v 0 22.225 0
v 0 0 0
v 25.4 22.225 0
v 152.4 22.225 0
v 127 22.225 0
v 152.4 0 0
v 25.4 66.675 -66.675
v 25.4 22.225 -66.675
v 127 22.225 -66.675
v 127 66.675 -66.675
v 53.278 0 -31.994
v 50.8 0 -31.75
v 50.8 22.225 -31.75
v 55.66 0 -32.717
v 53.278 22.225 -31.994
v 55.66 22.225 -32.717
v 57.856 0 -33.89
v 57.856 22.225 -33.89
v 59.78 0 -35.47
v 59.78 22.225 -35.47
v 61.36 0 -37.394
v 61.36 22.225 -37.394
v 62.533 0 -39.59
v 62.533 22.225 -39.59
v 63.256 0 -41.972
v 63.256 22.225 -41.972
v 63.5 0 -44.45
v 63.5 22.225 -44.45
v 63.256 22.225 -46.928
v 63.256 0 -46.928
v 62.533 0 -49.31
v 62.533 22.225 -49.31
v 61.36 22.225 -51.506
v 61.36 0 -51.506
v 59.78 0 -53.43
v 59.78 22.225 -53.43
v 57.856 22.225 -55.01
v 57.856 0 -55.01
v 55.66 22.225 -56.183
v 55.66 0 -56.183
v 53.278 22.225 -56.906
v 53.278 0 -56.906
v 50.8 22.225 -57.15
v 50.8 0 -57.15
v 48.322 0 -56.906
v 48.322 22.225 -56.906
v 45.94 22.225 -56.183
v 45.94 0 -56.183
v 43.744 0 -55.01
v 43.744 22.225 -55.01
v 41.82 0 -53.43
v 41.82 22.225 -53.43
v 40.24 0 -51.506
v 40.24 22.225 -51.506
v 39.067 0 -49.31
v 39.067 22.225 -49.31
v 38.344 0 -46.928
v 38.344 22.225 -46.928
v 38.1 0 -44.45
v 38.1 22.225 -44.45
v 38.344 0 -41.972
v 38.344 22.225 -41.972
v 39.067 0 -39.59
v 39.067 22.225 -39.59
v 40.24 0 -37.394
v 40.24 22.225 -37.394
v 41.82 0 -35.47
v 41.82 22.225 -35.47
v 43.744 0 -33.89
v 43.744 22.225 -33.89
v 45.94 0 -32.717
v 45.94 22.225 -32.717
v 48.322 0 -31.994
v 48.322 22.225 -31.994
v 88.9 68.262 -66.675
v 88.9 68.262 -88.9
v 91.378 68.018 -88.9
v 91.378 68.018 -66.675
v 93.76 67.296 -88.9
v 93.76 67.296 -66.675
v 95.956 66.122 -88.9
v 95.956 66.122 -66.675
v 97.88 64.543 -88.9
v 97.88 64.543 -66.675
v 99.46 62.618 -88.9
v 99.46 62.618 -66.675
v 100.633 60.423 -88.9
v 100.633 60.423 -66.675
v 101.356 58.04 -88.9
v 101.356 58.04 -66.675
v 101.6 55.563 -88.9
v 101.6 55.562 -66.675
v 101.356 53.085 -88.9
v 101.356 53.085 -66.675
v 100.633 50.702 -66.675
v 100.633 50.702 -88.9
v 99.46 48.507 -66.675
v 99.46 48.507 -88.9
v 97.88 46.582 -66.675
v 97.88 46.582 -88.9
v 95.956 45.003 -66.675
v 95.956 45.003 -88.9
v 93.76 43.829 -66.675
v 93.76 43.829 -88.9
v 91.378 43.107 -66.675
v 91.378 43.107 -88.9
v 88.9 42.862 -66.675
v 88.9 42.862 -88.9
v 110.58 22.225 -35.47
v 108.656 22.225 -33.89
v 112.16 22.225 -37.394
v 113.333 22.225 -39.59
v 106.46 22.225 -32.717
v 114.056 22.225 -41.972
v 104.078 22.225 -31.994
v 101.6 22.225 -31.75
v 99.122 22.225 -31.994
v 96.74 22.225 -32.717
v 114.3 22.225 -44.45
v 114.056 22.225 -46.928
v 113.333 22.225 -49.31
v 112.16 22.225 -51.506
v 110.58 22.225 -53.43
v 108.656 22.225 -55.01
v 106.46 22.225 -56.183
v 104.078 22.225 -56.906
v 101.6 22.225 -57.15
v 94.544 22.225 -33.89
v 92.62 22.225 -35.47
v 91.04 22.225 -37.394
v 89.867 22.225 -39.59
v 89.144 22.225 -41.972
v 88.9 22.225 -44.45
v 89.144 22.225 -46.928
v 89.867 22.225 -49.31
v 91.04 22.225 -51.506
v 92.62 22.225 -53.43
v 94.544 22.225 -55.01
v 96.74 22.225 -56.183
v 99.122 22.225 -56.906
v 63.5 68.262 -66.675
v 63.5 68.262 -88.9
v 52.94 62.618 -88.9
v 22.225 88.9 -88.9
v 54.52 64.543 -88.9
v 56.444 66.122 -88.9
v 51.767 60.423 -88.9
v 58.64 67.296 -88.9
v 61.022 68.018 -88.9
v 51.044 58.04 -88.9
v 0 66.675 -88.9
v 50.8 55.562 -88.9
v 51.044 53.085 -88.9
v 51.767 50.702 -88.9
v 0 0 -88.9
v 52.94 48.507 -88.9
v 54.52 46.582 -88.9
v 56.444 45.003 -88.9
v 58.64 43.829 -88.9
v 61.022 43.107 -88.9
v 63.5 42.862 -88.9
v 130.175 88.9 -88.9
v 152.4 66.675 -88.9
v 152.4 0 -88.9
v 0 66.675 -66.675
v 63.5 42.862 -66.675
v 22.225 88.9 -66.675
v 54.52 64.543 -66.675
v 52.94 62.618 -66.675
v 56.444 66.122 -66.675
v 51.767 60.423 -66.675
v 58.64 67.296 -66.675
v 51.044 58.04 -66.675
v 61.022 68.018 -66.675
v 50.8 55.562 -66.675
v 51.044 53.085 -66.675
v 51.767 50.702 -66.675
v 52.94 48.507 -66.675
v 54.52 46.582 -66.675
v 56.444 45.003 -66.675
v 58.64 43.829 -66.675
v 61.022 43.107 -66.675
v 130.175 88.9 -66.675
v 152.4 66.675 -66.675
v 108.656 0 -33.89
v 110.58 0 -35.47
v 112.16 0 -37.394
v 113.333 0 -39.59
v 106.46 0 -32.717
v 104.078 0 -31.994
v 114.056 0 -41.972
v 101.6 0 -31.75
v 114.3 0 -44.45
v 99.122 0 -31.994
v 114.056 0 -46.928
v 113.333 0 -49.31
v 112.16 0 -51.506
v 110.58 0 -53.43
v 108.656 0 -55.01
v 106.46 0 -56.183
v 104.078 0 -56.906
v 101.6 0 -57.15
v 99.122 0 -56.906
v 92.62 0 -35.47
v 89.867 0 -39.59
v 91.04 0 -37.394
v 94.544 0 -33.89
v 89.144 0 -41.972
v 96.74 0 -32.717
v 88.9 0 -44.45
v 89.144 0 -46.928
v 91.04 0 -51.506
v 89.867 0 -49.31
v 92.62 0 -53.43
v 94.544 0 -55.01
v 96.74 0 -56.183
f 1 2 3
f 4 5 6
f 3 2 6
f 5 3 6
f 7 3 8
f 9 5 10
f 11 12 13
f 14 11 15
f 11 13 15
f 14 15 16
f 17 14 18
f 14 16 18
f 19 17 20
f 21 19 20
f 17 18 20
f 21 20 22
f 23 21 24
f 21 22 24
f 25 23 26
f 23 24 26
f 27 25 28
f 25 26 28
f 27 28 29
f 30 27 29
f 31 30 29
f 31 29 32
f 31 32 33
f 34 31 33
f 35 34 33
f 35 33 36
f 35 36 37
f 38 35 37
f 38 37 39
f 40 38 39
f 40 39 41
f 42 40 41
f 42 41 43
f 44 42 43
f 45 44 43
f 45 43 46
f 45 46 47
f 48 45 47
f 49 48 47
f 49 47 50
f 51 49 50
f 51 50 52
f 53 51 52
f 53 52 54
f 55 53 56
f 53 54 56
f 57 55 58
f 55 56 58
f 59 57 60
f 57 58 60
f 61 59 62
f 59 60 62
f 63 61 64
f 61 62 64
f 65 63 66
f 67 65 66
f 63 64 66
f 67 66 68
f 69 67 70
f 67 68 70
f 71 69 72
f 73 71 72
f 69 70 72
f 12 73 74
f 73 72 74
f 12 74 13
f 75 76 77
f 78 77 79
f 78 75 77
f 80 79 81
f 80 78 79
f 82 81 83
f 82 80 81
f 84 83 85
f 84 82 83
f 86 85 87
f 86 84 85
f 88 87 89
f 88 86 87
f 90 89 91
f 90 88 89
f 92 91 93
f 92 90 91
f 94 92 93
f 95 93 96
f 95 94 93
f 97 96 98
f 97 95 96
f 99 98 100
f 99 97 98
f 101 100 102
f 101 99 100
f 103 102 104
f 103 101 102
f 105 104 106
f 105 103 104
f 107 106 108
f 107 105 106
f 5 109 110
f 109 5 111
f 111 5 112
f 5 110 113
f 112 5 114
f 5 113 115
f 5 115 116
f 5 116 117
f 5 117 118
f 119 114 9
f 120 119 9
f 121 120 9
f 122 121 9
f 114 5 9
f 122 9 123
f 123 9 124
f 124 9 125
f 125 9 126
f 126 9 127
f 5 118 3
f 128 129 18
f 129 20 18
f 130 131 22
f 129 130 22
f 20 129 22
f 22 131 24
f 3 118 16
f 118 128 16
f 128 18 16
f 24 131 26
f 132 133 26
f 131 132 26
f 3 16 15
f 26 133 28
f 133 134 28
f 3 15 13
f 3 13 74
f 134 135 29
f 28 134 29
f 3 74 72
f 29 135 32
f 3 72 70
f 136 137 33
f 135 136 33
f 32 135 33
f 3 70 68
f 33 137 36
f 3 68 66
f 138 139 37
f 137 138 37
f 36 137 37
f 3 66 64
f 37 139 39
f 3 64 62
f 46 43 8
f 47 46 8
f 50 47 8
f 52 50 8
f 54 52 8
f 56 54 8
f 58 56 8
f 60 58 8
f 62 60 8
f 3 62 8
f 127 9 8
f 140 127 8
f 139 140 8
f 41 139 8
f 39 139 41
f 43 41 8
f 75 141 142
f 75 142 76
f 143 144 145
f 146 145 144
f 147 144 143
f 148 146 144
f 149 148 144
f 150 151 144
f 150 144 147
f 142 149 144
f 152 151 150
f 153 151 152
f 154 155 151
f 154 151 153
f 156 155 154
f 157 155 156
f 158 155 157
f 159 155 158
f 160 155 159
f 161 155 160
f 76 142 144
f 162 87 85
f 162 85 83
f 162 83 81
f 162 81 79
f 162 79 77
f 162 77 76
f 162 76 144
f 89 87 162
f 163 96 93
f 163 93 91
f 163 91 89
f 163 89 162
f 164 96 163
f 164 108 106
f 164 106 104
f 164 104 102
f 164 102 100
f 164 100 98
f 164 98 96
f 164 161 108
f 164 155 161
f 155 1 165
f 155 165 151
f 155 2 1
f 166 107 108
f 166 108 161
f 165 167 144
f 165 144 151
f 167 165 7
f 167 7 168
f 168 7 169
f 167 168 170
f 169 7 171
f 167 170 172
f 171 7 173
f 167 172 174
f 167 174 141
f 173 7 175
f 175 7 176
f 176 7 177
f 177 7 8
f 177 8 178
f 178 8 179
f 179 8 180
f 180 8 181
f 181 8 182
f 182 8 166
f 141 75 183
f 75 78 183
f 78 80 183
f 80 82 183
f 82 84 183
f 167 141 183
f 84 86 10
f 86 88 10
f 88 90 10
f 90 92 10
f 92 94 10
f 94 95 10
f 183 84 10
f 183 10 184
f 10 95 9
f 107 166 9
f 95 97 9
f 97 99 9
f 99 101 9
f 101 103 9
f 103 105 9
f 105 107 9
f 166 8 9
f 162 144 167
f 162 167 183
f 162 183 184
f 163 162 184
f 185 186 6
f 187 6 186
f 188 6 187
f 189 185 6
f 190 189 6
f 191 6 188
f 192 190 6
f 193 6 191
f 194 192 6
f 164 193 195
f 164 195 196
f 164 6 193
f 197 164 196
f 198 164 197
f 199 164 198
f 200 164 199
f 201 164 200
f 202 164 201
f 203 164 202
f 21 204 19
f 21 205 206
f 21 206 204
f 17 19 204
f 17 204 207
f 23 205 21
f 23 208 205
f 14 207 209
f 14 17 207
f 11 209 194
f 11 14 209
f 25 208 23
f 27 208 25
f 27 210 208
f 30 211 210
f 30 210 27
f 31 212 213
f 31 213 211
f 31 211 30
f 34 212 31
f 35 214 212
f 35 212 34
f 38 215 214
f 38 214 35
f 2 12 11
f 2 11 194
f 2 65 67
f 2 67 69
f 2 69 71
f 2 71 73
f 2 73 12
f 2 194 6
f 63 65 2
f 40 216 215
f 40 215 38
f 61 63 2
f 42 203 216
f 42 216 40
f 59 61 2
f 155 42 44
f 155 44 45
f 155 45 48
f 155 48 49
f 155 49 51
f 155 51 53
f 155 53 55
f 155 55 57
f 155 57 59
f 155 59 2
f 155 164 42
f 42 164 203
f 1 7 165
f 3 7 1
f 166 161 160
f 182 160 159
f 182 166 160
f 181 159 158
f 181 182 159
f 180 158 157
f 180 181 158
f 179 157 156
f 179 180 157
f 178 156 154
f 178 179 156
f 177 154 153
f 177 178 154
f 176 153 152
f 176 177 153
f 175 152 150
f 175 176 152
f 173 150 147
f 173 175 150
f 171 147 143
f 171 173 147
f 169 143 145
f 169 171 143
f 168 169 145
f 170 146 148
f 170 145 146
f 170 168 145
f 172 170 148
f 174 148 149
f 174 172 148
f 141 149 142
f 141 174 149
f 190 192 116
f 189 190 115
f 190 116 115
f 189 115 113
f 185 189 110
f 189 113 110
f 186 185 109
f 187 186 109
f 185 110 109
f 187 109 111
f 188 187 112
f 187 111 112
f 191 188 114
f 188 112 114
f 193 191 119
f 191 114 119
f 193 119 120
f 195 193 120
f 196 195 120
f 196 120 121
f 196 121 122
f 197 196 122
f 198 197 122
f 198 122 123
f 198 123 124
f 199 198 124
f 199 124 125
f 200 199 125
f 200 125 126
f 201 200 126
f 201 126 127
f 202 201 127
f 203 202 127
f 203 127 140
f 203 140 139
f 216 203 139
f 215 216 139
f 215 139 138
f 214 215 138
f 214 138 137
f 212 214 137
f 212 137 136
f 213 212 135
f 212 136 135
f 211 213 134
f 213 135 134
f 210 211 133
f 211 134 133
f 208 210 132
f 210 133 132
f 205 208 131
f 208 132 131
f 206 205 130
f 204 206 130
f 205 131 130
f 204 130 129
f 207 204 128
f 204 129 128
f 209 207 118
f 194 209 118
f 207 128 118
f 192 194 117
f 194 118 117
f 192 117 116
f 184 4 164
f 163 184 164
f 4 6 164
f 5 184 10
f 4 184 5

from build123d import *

# Parameters (mm, degrees)
BOSS_EXTRUDE2_DEPTH = 22.225
SKETCH4_W           = 25.4
SKETCH4_H           = 66.675
BOSS_EXTRUDE5_DEPTH = 44.45
CUT_EXTRUDE1_DEPTH  = 189.612103602
SKETCH6_W           = 152.4
SKETCH6_H           = 22.225
BOSS_EXTRUDE6_DEPTH = 66.675
CUT_EXTRUDE2_DEPTH  = 189.612103602
CUT_EXTRUDE3_DEPTH  = 189.612103602
SKETCH9_R           = 12.7
CUT_EXTRUDE4_DEPTH  = 189.612103602
CUT_EXTRUDE5_DEPTH  = 189.612103602


with BuildPart() as part:
    # Sketch1 → Boss-Extrude2 (new body)
    with BuildSketch(Plane(origin=(0, 0, 0), x_dir=(1, 0, 0), z_dir=(0, 1, 0))):
        Polygon((0, 0), (0, 88.9), (25.4, 88.9), (127, 88.9), (152.4, 88.9), (152.4, 0), align=None)
    extrude(amount=BOSS_EXTRUDE2_DEPTH)

    # Sketch4 → Boss-Extrude5 (add)
    with BuildSketch(Plane(origin=(0, 22.225, 0), x_dir=(1, 0, 0), z_dir=(0, 1, 0))):
        with Locations((12.7, 33.3375)):
            Rectangle(SKETCH4_W, SKETCH4_H)
        with Locations((139.7, 33.3375)):
            Rectangle(SKETCH4_W, SKETCH4_H)
    extrude(amount=BOSS_EXTRUDE5_DEPTH)

    # Sketch5 → Cut-Extrude1 (cut, through all)
    with BuildSketch(Plane(origin=(152.4, 0, 0), x_dir=(0, 0, -1), z_dir=(1, 0, 0))):
        Polygon((66.675, 66.675), (0, 22.225), (0, 66.675), align=None)
    extrude(amount=-CUT_EXTRUDE1_DEPTH, mode=Mode.SUBTRACT)

    # Sketch6 → Boss-Extrude6 (add)
    with BuildSketch(Plane(origin=(0, 22.225, 0), x_dir=(1, 0, 0), z_dir=(0, 1, 0))):
        with Locations((76.2, 77.7875)):
            Rectangle(SKETCH6_W, SKETCH6_H)
    extrude(amount=BOSS_EXTRUDE6_DEPTH)

    # Sketch7 → Cut-Extrude2 (cut, through all)
    with BuildSketch(Plane.XY.offset(-66.675)):
        Polygon((152.4, 66.675), (152.4, 88.9), (130.175, 88.9), align=None)
    extrude(amount=-CUT_EXTRUDE2_DEPTH, mode=Mode.SUBTRACT)

    # Sketch8 → Cut-Extrude3 (cut, through all)
    with BuildSketch(Plane.XY.offset(-66.675)):
        Polygon((0, 88.9), (22.225, 88.9), (0, 66.675), align=None)
    extrude(amount=-CUT_EXTRUDE3_DEPTH, mode=Mode.SUBTRACT)

    # Sketch9 → Cut-Extrude4 (cut, through all)
    with BuildSketch(Plane(origin=(0, 22.225, 0), x_dir=(1, 0, 0), z_dir=(0, 1, 0))):
        with Locations(Location((50.8, 44.45, 0), (0, 0, 270))):
            Circle(SKETCH9_R)
        with Locations(Location((101.6, 44.45, 0), (0, 0, 270))):
            Circle(SKETCH9_R)
    extrude(amount=-CUT_EXTRUDE4_DEPTH, mode=Mode.SUBTRACT)

    # Sketch12 → Cut-Extrude5 (cut, through all)
    with BuildSketch(Plane.XY.offset(-66.675)):
        with BuildLine():
            Line((63.5, 68.2625), (88.9, 68.2625))
            ThreePointArc((88.9, 68.2625), (101.6, 55.5625), (88.9, 42.8625))
            Line((88.9, 42.8625), (63.5, 42.8625))
            ThreePointArc((63.5, 42.8625), (50.8, 55.5625), (63.5, 68.2625))
        make_face()
    extrude(amount=-CUT_EXTRUDE5_DEPTH, mode=Mode.SUBTRACT)


solid = part.part
